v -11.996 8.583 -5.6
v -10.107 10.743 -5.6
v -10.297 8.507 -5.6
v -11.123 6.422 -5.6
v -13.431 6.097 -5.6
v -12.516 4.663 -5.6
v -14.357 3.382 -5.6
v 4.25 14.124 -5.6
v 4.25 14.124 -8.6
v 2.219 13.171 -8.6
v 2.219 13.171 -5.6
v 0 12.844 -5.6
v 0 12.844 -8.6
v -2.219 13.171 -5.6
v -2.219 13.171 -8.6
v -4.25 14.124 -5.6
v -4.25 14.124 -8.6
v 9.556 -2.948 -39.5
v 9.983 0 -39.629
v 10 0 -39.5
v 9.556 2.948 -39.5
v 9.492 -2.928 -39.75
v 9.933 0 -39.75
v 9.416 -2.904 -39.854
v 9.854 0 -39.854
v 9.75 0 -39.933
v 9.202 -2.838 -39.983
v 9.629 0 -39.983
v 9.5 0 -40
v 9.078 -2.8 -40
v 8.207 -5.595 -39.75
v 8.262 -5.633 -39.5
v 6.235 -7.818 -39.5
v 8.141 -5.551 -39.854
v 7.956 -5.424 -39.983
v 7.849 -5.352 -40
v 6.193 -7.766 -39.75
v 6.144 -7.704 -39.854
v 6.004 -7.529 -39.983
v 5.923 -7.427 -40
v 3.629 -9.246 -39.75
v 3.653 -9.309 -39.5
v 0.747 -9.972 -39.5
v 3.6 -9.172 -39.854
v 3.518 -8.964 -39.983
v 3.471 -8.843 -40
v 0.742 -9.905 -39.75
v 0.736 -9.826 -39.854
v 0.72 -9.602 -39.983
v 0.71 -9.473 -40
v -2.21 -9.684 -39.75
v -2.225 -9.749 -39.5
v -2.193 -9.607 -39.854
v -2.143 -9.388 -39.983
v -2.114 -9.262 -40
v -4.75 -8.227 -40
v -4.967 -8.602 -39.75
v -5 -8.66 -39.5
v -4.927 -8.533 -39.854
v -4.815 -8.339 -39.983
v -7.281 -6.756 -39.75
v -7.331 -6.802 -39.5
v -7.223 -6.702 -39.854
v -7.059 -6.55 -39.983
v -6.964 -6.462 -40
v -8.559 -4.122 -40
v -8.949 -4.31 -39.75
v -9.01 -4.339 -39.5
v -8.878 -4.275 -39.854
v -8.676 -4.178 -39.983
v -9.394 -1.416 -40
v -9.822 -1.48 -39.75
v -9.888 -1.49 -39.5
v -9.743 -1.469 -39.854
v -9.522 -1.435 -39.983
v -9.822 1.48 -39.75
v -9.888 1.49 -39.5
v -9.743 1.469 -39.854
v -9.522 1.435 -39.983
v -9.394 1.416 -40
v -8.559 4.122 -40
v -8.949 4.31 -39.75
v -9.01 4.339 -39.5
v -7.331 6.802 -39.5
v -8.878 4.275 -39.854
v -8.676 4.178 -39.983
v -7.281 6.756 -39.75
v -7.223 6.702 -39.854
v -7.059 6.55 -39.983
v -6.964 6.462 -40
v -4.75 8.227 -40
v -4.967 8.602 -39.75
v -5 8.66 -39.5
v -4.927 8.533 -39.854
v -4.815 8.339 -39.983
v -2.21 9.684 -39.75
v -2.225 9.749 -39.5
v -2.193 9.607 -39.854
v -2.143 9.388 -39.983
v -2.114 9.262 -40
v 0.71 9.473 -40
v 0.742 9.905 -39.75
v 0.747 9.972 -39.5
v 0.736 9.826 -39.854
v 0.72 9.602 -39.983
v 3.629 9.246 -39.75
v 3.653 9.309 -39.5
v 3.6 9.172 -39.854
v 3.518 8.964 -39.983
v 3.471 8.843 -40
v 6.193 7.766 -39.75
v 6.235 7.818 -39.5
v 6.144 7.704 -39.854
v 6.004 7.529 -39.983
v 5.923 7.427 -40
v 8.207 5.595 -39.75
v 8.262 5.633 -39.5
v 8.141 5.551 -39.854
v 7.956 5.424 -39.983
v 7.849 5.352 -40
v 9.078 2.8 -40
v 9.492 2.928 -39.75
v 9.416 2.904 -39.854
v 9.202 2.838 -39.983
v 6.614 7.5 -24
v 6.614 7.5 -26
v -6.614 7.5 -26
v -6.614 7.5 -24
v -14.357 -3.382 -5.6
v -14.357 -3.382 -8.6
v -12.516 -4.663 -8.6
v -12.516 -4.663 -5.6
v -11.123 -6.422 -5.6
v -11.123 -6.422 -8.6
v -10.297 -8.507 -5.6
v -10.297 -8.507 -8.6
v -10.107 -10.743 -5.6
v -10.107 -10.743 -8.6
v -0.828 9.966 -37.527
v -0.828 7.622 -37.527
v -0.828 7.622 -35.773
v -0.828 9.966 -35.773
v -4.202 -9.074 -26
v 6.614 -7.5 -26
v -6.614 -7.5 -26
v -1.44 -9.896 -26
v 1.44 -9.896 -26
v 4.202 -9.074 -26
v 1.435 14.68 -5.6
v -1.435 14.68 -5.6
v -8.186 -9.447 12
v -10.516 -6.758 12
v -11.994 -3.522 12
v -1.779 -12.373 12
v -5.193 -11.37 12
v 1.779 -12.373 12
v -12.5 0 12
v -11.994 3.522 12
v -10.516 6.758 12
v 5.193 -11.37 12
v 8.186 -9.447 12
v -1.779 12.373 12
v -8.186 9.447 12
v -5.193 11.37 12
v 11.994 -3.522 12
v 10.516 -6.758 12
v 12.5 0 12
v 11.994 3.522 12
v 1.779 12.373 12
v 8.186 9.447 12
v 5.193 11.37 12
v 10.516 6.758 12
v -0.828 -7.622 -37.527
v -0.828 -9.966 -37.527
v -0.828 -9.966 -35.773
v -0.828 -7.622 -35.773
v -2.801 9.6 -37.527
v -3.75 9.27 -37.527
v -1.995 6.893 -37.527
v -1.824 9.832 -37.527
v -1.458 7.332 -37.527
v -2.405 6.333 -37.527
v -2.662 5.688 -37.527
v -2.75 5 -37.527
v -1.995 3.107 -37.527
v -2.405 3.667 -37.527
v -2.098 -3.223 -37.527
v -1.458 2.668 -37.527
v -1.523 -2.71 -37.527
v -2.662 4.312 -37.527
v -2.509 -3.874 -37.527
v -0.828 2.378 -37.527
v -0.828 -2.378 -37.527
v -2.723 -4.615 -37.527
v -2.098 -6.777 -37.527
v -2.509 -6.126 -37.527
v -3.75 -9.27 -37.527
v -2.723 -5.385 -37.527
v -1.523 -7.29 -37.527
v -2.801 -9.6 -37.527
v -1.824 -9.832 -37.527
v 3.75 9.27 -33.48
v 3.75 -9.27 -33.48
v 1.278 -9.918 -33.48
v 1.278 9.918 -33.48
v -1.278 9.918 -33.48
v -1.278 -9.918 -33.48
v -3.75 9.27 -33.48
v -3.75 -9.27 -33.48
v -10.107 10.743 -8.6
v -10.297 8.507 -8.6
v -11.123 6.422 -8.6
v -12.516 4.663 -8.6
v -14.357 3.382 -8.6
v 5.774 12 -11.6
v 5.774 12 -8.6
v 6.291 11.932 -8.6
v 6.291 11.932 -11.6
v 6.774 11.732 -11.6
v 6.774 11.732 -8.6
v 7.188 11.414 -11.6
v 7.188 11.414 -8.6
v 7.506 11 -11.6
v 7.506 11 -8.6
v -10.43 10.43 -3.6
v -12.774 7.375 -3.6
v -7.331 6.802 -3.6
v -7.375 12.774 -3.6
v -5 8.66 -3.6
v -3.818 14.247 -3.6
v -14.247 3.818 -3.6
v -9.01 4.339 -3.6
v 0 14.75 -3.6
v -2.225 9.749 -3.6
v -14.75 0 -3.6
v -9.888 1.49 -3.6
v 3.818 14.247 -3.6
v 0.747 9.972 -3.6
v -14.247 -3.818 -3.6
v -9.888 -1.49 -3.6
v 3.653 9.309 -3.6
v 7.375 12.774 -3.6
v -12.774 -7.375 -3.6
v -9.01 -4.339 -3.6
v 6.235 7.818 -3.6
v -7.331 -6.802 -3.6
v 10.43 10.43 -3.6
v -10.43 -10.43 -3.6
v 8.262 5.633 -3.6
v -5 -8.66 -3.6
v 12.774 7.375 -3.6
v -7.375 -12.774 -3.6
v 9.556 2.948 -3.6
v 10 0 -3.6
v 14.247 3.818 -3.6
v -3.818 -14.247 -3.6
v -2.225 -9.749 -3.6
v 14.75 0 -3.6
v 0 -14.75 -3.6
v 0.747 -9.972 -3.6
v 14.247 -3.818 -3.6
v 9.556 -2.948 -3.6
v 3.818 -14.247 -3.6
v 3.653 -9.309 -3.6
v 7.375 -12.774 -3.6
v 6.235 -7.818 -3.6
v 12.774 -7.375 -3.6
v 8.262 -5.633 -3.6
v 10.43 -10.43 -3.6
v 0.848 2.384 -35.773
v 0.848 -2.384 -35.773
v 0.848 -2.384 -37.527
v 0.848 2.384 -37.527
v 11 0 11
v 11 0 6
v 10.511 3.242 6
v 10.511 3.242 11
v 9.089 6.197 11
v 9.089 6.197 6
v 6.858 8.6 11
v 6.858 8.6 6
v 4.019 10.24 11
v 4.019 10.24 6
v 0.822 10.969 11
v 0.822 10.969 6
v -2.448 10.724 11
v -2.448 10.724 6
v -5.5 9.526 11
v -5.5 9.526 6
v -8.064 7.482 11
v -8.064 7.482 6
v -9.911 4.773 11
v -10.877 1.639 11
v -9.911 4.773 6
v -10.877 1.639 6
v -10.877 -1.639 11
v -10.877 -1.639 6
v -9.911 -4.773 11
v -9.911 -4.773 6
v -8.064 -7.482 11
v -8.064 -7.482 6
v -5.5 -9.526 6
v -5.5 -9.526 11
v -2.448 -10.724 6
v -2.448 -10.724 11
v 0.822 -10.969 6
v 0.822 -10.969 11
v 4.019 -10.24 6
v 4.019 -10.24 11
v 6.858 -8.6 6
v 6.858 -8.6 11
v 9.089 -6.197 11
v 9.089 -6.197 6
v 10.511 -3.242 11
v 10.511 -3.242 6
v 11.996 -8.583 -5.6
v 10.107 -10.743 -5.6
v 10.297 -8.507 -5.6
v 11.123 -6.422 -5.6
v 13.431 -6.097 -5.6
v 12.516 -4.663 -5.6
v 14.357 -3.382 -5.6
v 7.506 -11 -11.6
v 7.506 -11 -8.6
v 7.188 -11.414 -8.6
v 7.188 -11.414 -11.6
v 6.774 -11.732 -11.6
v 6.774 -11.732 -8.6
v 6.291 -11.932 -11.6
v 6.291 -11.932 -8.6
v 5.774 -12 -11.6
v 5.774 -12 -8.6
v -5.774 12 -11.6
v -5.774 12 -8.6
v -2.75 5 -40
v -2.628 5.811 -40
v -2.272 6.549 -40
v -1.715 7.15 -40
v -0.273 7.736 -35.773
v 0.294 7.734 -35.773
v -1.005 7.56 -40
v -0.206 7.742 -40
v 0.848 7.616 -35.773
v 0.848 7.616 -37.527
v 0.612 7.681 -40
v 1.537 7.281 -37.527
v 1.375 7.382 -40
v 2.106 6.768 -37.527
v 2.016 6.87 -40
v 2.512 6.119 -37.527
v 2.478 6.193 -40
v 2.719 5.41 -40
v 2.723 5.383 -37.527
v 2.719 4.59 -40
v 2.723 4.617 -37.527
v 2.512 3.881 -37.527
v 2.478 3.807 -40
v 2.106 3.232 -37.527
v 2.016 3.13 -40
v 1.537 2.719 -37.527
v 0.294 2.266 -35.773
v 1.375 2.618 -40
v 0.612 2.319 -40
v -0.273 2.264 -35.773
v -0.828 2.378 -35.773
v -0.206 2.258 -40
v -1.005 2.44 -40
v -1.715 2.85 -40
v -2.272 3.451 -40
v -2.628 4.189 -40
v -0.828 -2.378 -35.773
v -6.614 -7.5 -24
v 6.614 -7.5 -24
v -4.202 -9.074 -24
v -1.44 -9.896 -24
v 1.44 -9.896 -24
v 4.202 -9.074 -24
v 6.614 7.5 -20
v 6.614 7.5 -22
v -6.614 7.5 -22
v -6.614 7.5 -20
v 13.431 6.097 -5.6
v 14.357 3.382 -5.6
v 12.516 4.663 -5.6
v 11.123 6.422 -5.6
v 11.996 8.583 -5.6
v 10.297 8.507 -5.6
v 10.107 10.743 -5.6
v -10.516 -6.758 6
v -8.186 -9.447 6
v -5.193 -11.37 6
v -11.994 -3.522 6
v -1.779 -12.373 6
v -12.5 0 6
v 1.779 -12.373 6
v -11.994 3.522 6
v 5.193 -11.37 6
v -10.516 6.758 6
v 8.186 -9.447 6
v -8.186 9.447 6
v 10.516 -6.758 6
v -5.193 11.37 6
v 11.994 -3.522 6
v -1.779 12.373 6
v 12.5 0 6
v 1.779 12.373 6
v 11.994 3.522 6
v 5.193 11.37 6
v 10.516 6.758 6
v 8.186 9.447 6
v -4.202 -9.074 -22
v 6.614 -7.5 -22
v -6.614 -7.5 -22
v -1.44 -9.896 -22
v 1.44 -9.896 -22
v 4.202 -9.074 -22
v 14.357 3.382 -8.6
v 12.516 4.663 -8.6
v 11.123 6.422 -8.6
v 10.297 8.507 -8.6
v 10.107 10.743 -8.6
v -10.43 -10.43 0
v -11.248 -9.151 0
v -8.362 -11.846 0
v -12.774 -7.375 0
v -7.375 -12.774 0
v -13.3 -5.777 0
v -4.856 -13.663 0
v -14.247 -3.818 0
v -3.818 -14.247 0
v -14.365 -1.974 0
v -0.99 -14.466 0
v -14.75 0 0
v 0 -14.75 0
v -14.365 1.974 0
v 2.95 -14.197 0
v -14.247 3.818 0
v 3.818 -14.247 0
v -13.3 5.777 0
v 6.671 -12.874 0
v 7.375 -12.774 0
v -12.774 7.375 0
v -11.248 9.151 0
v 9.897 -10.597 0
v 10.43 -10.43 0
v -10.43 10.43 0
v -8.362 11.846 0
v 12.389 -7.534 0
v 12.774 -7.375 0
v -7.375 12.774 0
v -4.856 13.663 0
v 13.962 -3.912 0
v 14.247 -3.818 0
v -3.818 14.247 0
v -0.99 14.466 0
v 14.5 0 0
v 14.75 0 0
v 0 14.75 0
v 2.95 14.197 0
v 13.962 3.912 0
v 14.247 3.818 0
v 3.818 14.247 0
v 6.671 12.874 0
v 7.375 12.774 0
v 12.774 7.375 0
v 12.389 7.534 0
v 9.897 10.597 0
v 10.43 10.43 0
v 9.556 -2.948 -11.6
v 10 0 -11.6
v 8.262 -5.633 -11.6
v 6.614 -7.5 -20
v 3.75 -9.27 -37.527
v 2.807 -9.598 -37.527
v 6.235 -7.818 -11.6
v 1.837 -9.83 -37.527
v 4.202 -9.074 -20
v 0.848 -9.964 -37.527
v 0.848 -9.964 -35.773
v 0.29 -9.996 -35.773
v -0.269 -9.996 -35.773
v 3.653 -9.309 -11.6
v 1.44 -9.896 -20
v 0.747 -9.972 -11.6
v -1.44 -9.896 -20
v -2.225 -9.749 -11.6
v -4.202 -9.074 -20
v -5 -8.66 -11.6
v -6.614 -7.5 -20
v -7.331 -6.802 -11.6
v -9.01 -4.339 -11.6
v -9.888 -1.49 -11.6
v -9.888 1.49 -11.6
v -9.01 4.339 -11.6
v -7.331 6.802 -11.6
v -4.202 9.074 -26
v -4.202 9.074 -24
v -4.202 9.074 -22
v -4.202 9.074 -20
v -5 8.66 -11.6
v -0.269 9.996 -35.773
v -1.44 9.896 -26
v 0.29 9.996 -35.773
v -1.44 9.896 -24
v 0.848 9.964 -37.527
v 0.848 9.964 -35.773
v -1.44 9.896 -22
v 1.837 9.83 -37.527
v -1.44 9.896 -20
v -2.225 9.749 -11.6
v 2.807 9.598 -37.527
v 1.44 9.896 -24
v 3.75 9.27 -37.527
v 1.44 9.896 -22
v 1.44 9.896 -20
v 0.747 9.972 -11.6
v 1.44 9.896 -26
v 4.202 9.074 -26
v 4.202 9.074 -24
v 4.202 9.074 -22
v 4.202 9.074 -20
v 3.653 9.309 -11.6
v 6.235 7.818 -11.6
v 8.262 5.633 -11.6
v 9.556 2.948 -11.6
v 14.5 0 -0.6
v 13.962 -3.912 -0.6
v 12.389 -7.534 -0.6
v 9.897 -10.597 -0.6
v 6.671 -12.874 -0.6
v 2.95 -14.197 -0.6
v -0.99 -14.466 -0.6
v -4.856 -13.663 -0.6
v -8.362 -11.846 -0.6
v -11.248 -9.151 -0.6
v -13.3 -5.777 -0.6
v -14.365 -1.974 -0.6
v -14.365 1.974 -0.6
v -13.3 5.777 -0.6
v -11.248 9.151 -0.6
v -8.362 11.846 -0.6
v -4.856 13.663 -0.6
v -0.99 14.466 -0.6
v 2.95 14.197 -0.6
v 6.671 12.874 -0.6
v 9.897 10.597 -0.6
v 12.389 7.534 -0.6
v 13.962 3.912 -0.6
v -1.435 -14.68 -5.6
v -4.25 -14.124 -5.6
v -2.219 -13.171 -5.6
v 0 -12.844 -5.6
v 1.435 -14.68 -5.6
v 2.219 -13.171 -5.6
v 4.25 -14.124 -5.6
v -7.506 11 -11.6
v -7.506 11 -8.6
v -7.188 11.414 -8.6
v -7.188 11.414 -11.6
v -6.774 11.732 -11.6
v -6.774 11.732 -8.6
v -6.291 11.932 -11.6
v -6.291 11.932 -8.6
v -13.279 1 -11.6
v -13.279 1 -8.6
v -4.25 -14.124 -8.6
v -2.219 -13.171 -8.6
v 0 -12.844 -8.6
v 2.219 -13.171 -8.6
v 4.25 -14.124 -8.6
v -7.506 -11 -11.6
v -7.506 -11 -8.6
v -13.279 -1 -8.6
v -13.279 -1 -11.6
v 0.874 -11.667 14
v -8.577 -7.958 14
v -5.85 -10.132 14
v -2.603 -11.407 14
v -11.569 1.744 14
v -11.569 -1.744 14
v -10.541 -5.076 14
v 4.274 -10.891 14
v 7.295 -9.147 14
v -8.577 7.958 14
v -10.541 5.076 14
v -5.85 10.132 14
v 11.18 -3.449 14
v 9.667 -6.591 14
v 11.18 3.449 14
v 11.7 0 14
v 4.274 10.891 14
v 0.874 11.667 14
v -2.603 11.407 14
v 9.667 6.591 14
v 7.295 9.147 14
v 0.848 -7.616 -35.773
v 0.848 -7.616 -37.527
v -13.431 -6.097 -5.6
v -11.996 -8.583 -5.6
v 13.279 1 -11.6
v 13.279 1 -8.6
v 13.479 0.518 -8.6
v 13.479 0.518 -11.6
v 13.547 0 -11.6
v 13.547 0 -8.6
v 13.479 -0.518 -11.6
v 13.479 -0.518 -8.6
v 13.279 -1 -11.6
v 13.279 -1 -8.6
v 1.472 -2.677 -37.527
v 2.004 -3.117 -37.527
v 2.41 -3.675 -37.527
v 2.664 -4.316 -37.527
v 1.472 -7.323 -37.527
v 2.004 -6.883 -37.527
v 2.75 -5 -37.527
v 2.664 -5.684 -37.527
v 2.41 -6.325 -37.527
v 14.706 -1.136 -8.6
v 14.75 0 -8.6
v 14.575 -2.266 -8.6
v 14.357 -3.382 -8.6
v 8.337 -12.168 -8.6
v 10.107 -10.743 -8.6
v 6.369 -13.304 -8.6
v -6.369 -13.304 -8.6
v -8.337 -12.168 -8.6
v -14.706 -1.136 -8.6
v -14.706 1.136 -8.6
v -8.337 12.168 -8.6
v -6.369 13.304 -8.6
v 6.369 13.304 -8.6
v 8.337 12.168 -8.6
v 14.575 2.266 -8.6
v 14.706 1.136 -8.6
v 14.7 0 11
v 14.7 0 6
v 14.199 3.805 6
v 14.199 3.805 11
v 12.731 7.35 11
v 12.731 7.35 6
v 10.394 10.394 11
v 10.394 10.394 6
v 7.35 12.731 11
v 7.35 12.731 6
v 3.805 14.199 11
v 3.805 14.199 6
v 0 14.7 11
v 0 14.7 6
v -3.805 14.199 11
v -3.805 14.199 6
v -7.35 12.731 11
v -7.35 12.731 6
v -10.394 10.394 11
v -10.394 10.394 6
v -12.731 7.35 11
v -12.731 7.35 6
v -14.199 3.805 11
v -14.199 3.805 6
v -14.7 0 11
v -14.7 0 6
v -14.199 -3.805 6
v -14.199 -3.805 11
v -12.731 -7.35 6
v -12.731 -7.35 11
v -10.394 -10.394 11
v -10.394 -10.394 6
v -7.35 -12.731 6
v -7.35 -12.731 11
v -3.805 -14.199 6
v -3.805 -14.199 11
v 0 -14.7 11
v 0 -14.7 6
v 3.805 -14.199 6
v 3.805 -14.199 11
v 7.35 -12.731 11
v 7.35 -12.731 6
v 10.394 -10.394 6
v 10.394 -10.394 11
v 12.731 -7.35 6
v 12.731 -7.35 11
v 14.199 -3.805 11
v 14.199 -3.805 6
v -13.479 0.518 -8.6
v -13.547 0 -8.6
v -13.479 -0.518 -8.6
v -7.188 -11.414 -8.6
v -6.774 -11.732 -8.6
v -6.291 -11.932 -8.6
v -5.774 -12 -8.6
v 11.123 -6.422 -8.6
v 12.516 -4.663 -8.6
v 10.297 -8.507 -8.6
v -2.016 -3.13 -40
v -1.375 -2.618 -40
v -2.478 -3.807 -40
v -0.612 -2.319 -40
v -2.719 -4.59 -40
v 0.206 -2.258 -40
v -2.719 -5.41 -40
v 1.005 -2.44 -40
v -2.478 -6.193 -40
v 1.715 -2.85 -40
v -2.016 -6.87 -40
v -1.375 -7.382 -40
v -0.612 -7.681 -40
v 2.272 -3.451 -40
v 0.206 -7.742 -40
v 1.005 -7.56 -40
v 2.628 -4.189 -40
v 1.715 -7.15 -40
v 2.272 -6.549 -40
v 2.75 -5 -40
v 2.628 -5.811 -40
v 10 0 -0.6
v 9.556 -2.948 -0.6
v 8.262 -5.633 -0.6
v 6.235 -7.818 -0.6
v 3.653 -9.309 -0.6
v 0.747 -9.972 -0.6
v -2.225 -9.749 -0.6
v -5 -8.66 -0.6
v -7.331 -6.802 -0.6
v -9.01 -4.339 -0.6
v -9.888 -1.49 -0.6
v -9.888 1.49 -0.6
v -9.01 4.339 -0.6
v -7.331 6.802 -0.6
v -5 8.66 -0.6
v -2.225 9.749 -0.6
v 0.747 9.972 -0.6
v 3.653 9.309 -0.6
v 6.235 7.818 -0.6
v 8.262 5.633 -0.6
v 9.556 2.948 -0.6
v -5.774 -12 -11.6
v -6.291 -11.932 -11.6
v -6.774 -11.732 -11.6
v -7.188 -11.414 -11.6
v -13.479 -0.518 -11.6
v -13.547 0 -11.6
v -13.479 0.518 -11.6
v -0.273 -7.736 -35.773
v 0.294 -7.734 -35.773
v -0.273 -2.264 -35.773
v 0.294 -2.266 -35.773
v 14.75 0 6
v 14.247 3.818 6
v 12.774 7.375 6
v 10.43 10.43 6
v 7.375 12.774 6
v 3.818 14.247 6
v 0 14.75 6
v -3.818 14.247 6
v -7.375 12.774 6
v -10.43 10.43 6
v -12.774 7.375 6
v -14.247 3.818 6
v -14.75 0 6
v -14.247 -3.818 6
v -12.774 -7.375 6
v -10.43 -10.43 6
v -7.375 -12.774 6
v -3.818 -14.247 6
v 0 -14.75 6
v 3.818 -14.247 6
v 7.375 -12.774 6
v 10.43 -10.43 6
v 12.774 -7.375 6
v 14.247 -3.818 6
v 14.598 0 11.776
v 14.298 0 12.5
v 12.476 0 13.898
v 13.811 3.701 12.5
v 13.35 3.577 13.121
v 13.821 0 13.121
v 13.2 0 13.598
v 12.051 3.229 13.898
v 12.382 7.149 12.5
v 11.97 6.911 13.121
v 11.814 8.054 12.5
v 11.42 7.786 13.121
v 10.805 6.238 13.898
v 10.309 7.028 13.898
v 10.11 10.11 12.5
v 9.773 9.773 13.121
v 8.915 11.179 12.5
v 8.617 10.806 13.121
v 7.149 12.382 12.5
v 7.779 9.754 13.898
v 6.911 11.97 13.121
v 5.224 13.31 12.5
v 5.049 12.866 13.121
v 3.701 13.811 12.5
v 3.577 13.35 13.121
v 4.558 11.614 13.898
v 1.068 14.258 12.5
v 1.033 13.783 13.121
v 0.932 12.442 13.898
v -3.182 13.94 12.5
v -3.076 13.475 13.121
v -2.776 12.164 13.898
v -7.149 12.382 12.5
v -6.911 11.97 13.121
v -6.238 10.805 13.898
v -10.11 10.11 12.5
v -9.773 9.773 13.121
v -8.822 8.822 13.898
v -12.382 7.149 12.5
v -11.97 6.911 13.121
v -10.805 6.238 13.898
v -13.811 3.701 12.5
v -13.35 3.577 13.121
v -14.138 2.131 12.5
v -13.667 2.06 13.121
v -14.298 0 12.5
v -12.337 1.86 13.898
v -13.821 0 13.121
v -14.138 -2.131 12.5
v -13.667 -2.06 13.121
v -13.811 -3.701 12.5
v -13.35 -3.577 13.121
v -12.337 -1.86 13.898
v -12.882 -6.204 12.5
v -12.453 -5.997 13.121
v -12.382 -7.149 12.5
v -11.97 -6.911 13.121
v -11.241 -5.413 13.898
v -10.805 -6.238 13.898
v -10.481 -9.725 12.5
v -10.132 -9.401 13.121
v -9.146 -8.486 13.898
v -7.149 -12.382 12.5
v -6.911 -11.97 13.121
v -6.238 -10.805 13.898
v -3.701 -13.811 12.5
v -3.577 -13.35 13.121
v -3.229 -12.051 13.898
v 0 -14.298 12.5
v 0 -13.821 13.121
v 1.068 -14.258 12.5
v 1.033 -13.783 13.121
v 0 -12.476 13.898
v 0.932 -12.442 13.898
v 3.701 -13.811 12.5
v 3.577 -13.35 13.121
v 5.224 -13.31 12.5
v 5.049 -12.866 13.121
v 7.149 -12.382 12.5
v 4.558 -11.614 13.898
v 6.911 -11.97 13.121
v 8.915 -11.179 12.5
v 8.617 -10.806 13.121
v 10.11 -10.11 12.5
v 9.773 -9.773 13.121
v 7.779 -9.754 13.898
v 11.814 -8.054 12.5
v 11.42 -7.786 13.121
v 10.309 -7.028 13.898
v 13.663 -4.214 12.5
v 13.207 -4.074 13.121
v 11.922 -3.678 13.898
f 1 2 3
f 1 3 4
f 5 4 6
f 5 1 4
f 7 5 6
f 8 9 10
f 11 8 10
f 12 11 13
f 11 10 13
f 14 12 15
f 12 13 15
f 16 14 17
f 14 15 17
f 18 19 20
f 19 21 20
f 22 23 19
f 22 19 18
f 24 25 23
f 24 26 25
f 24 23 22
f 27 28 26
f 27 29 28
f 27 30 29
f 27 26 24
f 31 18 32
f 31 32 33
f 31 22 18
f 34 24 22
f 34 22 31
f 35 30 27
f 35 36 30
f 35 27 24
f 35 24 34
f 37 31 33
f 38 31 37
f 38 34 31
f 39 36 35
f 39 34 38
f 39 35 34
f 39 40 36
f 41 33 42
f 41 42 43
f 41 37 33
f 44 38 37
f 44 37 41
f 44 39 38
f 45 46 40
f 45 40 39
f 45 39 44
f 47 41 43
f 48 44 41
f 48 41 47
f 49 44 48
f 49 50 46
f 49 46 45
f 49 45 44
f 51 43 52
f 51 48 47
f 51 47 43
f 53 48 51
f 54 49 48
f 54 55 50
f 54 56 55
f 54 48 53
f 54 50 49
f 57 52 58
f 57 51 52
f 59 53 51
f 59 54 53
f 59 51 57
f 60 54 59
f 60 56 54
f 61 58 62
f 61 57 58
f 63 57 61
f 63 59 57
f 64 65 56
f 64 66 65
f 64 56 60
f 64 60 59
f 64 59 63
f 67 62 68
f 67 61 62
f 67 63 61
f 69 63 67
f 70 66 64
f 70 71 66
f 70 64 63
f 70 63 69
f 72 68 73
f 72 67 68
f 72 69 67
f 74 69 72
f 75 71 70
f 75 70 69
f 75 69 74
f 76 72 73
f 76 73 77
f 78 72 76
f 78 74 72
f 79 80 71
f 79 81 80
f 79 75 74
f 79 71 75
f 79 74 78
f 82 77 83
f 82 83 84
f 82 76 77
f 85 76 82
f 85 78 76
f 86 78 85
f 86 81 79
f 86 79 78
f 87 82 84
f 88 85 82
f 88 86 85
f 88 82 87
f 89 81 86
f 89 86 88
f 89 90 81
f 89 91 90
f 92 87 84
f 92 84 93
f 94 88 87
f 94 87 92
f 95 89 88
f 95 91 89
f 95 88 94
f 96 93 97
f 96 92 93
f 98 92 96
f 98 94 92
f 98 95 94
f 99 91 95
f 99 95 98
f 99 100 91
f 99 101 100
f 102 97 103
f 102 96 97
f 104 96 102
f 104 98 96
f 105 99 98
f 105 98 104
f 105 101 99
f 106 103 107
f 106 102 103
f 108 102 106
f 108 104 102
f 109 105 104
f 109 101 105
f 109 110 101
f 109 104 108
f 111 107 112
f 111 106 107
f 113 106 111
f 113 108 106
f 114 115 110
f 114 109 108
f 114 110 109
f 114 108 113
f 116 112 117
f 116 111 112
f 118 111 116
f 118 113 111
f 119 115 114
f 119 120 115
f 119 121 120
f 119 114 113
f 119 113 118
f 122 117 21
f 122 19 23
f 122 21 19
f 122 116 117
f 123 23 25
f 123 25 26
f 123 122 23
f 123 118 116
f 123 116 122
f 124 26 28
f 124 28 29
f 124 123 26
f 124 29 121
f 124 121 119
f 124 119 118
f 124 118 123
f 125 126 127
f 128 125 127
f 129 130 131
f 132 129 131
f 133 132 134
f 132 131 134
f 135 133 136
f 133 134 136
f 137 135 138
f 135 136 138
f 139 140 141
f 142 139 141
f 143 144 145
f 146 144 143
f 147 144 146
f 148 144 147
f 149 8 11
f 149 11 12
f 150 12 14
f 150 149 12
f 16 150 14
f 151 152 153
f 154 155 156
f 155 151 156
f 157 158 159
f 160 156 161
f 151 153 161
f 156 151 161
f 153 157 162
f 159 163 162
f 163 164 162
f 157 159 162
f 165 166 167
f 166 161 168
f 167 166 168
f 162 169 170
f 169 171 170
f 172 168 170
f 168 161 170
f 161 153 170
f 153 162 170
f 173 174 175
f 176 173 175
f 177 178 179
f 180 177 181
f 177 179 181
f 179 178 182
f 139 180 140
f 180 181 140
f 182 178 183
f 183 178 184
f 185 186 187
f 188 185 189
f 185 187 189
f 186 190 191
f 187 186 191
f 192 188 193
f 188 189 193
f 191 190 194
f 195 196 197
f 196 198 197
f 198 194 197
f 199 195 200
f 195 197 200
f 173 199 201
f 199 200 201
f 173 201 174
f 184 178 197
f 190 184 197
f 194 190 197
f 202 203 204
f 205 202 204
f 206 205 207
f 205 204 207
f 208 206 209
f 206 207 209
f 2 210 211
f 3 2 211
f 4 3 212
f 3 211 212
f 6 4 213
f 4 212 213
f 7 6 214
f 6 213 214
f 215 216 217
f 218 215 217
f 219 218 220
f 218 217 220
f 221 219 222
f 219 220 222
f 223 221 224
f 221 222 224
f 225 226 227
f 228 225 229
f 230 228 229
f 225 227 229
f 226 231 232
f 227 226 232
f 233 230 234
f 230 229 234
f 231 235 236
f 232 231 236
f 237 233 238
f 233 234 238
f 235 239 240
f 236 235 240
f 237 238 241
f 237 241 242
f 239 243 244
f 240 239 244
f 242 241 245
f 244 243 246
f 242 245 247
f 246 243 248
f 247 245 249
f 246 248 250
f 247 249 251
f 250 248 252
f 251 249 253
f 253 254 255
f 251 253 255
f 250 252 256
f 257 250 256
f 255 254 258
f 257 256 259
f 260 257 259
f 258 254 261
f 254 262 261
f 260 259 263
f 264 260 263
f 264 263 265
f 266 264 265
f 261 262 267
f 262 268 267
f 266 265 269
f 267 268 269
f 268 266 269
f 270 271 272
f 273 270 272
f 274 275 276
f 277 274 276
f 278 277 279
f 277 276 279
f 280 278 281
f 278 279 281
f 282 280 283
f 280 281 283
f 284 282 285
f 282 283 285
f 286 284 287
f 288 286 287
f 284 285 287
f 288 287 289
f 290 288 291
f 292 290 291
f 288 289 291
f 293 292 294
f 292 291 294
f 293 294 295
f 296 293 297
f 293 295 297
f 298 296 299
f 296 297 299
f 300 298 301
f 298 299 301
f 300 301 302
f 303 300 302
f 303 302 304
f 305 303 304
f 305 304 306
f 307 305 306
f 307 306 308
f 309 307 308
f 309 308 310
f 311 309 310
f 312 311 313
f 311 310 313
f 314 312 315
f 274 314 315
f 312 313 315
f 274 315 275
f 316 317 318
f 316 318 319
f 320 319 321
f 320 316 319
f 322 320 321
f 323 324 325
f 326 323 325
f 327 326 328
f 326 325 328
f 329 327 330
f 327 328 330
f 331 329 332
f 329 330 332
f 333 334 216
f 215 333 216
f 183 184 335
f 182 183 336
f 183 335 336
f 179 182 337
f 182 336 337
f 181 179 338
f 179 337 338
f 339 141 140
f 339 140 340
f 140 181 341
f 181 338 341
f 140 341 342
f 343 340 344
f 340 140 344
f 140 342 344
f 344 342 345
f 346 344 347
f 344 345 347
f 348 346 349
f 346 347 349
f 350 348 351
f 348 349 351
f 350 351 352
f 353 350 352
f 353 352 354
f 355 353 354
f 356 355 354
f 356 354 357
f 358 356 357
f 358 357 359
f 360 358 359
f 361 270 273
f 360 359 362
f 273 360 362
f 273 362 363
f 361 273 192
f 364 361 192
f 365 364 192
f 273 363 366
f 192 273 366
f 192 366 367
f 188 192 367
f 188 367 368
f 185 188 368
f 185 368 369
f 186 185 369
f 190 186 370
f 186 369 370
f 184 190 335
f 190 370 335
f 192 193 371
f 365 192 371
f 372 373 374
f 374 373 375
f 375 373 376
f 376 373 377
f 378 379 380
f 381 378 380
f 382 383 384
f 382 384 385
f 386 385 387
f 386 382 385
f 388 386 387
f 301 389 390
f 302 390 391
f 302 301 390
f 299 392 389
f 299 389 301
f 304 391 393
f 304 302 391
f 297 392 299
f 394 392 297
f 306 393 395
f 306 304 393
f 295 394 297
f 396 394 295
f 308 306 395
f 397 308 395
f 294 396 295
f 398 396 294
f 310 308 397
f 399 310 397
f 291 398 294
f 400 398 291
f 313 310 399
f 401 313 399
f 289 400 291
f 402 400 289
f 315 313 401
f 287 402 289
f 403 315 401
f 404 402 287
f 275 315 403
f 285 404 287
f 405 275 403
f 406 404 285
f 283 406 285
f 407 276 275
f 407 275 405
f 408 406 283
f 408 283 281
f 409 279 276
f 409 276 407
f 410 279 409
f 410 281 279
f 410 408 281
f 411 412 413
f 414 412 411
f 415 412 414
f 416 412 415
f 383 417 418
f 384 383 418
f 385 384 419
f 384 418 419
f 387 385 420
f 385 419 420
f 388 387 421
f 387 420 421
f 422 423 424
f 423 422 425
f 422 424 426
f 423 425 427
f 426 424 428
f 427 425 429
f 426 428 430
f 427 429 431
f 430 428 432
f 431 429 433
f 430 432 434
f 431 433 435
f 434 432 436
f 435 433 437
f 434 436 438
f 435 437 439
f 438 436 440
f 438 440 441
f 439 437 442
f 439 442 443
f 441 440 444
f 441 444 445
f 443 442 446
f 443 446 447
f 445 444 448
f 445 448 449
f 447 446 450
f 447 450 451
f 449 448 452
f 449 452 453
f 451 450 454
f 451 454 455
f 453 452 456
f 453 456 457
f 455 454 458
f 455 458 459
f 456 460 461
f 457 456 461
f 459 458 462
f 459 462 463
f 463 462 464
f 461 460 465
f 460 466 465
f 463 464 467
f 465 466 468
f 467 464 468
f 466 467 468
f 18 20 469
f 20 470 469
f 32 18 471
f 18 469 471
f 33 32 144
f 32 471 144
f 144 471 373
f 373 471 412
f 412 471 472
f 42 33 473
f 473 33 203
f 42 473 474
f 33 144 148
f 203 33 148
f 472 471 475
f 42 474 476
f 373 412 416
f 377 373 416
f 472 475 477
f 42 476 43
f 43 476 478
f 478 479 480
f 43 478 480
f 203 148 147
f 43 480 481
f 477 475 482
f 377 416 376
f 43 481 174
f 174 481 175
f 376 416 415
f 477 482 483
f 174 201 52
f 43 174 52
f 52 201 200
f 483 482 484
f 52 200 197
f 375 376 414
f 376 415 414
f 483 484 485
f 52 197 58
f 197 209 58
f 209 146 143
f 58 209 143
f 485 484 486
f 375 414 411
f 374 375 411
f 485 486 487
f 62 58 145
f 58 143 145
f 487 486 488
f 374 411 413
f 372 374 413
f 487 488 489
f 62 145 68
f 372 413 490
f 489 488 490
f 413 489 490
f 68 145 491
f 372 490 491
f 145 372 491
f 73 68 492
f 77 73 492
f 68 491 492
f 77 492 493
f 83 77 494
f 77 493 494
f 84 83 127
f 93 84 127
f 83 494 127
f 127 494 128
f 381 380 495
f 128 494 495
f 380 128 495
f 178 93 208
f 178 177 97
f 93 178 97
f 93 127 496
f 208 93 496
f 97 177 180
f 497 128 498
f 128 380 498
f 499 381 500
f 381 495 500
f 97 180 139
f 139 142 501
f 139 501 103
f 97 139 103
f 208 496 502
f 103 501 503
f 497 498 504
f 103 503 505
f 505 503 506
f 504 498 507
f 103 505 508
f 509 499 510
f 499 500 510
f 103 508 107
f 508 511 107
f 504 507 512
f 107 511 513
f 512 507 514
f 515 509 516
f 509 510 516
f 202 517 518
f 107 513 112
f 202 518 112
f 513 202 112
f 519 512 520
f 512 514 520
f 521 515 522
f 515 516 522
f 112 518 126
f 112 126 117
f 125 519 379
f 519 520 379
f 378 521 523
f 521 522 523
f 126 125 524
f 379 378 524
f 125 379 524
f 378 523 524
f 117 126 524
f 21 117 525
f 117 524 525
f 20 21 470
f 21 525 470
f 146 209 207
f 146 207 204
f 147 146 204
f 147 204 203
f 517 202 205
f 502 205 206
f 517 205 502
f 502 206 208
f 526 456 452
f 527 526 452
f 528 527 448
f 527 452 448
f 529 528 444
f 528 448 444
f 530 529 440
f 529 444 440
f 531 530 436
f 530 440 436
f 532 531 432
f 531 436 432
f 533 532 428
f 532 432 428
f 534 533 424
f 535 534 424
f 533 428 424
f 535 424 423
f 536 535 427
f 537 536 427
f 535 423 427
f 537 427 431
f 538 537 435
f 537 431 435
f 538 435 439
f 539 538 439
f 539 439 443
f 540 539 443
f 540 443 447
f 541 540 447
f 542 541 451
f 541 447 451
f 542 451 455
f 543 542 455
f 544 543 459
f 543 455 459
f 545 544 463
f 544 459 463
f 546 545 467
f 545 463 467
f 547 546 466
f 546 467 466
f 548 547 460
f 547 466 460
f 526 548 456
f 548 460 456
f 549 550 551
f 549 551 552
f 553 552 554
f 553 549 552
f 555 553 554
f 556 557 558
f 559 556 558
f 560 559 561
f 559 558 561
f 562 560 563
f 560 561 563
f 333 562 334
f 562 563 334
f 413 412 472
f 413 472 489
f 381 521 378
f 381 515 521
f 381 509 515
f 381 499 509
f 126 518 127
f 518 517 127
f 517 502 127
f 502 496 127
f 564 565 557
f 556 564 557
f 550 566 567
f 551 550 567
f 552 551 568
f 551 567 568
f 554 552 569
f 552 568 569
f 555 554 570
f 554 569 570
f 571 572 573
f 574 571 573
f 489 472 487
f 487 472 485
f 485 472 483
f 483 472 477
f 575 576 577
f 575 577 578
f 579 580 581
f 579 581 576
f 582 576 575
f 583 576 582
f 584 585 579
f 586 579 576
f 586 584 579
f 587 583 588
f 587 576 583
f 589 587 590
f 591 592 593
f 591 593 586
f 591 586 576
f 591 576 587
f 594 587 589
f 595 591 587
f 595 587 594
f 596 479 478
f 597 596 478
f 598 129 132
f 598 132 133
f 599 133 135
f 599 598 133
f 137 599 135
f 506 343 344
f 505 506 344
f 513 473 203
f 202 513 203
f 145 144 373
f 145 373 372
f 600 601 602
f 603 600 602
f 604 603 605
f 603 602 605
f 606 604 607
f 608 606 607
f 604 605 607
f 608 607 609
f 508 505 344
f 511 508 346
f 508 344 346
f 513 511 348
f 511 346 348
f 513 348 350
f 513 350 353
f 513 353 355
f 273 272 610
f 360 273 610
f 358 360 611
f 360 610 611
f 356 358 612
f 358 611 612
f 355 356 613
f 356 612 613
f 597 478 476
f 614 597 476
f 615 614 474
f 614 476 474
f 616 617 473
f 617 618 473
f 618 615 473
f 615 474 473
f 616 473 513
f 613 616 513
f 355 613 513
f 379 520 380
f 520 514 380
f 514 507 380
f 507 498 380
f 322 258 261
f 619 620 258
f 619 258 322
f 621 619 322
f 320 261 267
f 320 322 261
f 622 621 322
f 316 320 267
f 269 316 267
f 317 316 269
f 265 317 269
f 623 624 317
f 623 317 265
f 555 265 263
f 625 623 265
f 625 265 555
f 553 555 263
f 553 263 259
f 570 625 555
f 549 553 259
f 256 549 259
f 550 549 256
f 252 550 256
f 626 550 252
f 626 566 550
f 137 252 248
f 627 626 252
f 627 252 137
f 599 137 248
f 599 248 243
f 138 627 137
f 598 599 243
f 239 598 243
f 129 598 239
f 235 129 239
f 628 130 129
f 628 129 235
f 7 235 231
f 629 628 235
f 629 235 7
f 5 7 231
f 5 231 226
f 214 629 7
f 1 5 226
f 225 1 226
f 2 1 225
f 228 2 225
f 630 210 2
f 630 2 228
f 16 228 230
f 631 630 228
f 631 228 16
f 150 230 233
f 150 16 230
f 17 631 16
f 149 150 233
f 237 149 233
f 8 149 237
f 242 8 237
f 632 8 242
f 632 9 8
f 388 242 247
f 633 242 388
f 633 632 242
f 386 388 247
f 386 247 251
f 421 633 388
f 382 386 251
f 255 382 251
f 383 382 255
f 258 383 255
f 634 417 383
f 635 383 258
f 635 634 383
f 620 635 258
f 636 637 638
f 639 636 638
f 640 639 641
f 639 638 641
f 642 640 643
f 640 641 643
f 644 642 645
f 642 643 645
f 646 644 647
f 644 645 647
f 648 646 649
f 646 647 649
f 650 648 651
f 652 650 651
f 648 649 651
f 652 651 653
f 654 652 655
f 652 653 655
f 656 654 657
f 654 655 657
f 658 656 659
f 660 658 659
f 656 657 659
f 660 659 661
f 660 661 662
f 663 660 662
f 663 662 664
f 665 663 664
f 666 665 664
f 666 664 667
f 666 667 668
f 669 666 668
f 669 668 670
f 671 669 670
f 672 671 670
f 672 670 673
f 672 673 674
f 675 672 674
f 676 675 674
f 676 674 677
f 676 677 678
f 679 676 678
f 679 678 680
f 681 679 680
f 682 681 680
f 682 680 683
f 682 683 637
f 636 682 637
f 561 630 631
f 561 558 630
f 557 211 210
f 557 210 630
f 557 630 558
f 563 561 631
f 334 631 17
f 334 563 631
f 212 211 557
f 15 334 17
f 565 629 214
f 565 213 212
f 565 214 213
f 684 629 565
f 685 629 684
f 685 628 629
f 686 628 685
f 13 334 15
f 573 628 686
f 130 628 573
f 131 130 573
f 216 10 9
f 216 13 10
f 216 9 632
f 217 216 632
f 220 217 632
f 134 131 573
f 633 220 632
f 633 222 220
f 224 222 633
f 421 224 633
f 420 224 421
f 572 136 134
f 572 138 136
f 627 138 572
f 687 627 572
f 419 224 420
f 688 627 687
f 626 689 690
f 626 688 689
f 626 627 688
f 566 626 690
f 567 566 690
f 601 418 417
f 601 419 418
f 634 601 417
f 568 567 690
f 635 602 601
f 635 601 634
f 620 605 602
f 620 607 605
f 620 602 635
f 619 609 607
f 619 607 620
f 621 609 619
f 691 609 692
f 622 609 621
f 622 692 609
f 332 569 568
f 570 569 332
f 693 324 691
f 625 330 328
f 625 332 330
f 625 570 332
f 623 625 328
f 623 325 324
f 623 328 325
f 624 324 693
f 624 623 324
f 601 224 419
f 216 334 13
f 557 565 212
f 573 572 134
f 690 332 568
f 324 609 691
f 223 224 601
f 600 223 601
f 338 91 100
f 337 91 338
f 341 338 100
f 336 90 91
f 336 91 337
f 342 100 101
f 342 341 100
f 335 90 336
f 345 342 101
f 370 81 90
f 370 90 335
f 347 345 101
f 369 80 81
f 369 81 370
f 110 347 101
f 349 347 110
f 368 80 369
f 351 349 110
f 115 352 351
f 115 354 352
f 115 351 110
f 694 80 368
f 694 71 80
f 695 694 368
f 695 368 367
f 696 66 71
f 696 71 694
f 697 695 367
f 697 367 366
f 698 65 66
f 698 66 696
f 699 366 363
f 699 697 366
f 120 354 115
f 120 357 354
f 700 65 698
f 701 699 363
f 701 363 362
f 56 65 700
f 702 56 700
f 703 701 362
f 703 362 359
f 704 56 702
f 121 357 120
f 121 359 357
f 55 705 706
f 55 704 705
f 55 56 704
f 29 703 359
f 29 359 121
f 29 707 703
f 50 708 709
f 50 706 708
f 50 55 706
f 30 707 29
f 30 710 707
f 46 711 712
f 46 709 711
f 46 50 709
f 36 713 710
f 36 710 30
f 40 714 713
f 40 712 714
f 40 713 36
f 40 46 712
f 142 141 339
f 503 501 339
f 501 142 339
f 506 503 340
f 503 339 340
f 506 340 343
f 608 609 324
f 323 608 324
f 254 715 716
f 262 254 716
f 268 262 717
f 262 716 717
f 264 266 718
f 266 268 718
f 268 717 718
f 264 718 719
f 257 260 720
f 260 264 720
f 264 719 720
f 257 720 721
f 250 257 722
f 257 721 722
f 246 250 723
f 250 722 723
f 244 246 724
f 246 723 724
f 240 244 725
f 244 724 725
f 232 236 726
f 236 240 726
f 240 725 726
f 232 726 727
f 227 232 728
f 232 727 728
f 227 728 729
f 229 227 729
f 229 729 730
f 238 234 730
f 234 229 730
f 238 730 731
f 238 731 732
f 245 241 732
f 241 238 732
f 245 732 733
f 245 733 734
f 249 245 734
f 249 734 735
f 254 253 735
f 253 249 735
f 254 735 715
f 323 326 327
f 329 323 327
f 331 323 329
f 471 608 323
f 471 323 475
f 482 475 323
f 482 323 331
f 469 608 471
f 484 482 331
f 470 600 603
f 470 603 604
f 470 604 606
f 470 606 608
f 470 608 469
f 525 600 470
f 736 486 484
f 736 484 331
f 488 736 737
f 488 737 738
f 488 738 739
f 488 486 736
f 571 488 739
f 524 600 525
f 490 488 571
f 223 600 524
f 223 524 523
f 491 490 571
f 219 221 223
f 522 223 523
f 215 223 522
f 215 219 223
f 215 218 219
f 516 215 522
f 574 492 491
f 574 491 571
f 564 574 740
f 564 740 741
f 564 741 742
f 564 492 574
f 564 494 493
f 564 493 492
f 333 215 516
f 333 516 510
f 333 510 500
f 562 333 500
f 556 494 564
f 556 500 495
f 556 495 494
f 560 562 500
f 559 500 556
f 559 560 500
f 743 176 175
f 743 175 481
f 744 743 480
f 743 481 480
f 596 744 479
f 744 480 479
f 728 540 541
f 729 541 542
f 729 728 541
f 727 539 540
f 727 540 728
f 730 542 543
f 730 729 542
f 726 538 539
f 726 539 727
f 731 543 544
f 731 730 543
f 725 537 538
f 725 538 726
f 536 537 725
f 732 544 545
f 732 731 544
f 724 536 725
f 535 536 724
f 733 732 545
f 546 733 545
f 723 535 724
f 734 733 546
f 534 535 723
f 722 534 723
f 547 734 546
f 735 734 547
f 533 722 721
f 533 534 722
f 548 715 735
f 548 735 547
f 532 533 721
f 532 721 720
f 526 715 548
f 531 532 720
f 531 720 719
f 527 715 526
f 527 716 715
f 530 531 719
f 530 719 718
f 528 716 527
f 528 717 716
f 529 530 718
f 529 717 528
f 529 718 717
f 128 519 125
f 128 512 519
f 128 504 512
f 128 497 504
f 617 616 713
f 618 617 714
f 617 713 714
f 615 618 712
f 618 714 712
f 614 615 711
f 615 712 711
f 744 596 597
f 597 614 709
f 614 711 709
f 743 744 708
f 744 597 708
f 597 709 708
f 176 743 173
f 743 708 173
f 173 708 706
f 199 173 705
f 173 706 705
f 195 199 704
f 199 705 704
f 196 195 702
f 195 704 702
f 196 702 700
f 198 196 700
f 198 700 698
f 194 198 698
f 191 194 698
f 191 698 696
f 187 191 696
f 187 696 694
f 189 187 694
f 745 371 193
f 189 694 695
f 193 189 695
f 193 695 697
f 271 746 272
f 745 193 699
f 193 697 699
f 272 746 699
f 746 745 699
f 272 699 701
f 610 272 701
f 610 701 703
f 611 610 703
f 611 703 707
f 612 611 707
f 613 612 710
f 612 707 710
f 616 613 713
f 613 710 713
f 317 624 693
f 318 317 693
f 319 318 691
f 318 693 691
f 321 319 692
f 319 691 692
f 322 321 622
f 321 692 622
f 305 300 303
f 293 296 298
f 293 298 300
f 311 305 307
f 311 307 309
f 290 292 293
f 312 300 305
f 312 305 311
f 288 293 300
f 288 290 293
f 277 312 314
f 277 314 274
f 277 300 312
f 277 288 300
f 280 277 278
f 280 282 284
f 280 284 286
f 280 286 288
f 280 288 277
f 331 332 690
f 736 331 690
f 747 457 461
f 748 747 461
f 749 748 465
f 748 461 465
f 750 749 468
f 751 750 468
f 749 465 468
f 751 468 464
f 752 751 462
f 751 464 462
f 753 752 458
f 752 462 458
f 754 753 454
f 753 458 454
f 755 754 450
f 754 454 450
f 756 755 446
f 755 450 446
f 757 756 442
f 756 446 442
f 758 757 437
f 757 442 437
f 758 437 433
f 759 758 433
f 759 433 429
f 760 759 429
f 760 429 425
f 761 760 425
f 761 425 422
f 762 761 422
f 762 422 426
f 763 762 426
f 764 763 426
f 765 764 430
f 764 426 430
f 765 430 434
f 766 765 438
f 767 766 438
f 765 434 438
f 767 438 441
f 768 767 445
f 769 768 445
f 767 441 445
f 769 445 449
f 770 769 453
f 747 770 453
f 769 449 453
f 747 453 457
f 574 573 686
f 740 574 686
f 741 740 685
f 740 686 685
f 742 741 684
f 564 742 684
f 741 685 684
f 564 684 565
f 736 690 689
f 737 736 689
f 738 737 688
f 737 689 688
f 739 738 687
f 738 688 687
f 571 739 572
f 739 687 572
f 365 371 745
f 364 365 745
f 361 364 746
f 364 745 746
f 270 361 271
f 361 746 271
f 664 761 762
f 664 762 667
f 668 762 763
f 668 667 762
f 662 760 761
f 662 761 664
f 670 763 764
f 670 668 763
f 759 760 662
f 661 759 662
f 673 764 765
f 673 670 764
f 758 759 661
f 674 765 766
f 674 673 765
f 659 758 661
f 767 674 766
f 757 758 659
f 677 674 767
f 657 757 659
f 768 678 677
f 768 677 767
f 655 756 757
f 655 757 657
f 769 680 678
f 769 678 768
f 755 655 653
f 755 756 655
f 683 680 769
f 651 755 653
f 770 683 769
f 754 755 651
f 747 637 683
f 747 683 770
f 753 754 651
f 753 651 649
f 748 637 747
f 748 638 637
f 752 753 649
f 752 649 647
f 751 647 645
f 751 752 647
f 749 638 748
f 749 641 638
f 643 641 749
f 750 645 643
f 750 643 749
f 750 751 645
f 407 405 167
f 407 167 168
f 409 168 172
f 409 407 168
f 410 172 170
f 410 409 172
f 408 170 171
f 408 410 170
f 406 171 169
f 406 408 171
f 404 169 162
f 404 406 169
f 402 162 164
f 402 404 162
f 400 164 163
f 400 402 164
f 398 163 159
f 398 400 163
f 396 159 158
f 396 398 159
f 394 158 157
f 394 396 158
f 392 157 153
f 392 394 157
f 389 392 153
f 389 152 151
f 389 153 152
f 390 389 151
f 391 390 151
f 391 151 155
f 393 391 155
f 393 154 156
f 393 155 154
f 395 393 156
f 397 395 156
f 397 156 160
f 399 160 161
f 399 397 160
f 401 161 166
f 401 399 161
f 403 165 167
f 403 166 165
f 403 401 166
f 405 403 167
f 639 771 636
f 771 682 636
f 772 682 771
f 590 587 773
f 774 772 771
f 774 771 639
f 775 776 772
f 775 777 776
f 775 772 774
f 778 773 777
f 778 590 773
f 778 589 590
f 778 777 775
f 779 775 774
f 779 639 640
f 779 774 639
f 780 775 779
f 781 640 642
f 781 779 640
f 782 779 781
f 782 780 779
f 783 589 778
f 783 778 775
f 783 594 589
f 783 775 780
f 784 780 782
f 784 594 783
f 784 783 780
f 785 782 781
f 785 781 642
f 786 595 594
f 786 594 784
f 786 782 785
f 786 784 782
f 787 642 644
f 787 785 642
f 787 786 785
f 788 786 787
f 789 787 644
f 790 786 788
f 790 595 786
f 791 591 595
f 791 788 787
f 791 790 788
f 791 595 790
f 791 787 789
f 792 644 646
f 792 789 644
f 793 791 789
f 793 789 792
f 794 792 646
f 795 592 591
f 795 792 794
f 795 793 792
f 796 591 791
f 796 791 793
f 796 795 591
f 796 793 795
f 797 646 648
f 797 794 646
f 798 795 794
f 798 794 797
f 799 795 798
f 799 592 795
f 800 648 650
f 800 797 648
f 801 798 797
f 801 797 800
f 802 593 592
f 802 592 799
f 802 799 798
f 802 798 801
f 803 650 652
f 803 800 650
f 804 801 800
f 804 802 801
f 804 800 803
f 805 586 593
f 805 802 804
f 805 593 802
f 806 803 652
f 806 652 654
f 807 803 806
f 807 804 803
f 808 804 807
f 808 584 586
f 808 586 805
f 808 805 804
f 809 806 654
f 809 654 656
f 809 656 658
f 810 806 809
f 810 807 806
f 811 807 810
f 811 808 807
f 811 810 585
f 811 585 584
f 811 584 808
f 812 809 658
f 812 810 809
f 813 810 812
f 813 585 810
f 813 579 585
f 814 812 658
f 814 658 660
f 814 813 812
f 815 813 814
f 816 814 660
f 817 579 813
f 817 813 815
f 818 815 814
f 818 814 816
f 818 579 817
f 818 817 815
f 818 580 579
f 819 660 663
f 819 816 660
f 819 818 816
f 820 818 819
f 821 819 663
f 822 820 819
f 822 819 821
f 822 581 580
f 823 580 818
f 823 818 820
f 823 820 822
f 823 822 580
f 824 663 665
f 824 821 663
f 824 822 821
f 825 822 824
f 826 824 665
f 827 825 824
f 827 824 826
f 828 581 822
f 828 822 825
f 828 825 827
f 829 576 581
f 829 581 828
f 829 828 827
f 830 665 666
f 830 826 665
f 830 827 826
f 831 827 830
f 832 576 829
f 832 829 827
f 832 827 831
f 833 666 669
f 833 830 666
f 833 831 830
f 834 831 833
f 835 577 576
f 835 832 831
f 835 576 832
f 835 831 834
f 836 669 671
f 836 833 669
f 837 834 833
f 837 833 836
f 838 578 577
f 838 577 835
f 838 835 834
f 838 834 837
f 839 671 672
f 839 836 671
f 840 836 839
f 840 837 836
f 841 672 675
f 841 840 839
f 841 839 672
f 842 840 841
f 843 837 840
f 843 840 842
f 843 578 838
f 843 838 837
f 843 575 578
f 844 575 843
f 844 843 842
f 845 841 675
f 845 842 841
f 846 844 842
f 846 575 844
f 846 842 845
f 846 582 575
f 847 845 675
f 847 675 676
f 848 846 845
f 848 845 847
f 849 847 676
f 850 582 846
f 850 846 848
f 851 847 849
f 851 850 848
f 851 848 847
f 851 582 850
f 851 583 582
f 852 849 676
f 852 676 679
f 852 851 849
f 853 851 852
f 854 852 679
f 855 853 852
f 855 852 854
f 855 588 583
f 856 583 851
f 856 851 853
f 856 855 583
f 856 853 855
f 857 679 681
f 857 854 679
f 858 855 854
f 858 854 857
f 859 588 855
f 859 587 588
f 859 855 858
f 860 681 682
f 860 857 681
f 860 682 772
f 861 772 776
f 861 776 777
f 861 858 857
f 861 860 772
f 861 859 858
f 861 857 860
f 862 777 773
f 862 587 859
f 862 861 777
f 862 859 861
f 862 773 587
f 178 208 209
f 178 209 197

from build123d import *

# Parameters (mm, degrees)
ESBO_O1_R             = 14.75
EXTRUS_O1_DEPTH       = 6
ESBO_O2_R             = 10
EXTRUS_O2_DEPTH       = 40
ESBO_O3_R             = 11
EXTRUS_O3_DEPTH       = 5
ESBO_O4_R             = 14.7
ESBO_O4_R_2           = 12.5
EXTRUS_O4_DEPTH       = 8
EXTRUS_O5_START       = -2
ESBO_O5_R             = 14.7
EXTRUS_O5_DEPTH       = 2
FILETE2_R             = 3
ESBO_O6_R             = 14.5
EXTRUS_O6_DEPTH       = 0.6
EXTRUS_O7_START       = 8
ESBO_O7_R             = 14.75
EXTRUS_O7_DEPTH       = 5
CORTE_EXTRUS_O1_DEPTH = 3
CIRPATTERN1_COUNT     = 6
EXTRUS_O8_DEPTH       = 3
FILETE3_R             = 0.5
CORTE_EXTRUS_O2_START = -14
ESBO_O10_W            = 40
ESBO_O10_H            = 25
ESBO_O10_W_2          = 30
ESBO_O10_H_2          = 15
CORTE_EXTRUS_O2_DEPTH = 2
LPATTERN1_COUNT       = 2
LPATTERN1_PITCH       = 4
ESBO_O11_R            = 2.75
CORTE_EXTRUS_O3_DEPTH = 5
CORTE_EXTRUS_O4_DEPTH = 12.5


with BuildPart() as part:
    # Esboço1 → Extrusão1 (new body)
    with BuildSketch(Plane.XY):
        Circle(ESBO_O1_R)
    extrude(amount=EXTRUS_O1_DEPTH)

    # Esboço2 → Extrusão2 (add)
    with BuildSketch(Plane(origin=(0, 0, 0), x_dir=(-1, 0, 0), z_dir=(0, 0, -1))):
        with Locations(Location((0, 0, 0), (0, 0, 180))):
            Circle(ESBO_O2_R)
    extrude(amount=EXTRUS_O2_DEPTH)

    # Esboço3 → Extrusão3 (add)
    with BuildSketch(Plane.XY.offset(6)):
        Circle(ESBO_O3_R)
    extrude(amount=EXTRUS_O3_DEPTH)

    # Esboço4 → Extrusão4 (add)
    with BuildSketch(Plane.XY.offset(6)):
        Circle(ESBO_O4_R)
        Circle(ESBO_O4_R_2, mode=Mode.SUBTRACT)
    extrude(amount=EXTRUS_O4_DEPTH)

    # Esboço5 → Extrusão5 (add)
    with BuildSketch(Plane.XY.offset(14).offset(EXTRUS_O5_START)):
        Circle(ESBO_O5_R)
    extrude(amount=EXTRUS_O5_DEPTH)

    # Filete2
    filete2_edges = [part.edges().sort_by_distance(p)[0] for p in [
        (-14.7, 0, 14),
    ]]
    fillet(filete2_edges, radius=FILETE2_R)

    # Esboço6 → Extrusão6 (add)
    with BuildSketch(Plane(origin=(0, 0, 0), x_dir=(-1, 0, 0), z_dir=(0, 0, -1))):
        with Locations(Location((0, 0, 0), (0, 0, 180))):
            Circle(ESBO_O6_R)
    extrude(amount=EXTRUS_O6_DEPTH)

    # Esboço7 → Extrusão7 (add)
    with BuildSketch(Plane(origin=(0, 0, -0.6), x_dir=(-1, 0, 0), z_dir=(0, 0, -1)).offset(EXTRUS_O7_START)):
        with Locations(Location((0, 0, 0), (0, 0, 180))):
            Circle(ESBO_O7_R)
    extrude(amount=-EXTRUS_O7_DEPTH)

    # Esboço8 → Corte-extrusão1 (cut)
    with BuildSketch(Plane(origin=(0, 0, -8.6), x_dir=(-1, 0, 0), z_dir=(0, 0, -1))):
        with BuildLine():
            ThreePointArc((-4.25, 14.124446892), (0, 12.843637989), (4.25, 14.124446892))
            ThreePointArc((4.25, 14.124446892), (0, 15.884854532), (-4.25, 14.124446892))
        make_face()
    corte_extrus_o1 = extrude(amount=-CORTE_EXTRUS_O1_DEPTH, mode=Mode.SUBTRACT)

    # CirPattern1: Corte-extrusão1 ×6 about axis
    cirpattern1_axis = Axis((0, 0, 0), (0, 0, 1))
    for i in range(1, CIRPATTERN1_COUNT):
        add(corte_extrus_o1.rotate(cirpattern1_axis, i * 360 / CIRPATTERN1_COUNT), mode=Mode.SUBTRACT)

    # Esboço9 → Extrusão8 (add)
    with BuildSketch(Plane(origin=(0, 0, -8.6), x_dir=(-1, 0, 0), z_dir=(0, 0, -1))):
        with BuildLine():
            Line((-7.505553499, 11), (-13.279056191, 1))
            ThreePointArc((-13.279056191, 1), (-13.547005384, 0), (-13.279056191, -1))
            Line((-13.279056191, -1), (-7.505553499, -11))
            ThreePointArc((-7.505553499, -11), (-6.773502692, -11.732050808), (-5.773502692, -12))
            Line((-5.773502692, -12), (5.773502692, -12))
            ThreePointArc((5.773502692, -12), (6.773502692, -11.732050808), (7.505553499, -11))
            Line((7.505553499, -11), (13.279056191, -1))
            ThreePointArc((13.279056191, -1), (13.547005384, 0), (13.279056191, 1))
            Line((13.279056191, 1), (7.505553499, 11))
            ThreePointArc((7.505553499, 11), (6.773502692, 11.732050808), (5.773502692, 12))
            Line((5.773502692, 12), (-5.773502692, 12))
            ThreePointArc((-5.773502692, 12), (-6.773502692, 11.732050808), (-7.505553499, 11))
        make_face()
    extrude(amount=EXTRUS_O8_DEPTH)

    # Filete3
    filete3_edges = [part.edges().sort_by_distance(p)[0] for p in [
        (-10, 0, -40),
    ]]
    fillet(filete3_edges, radius=FILETE3_R)

    # Esboço10 → Corte-extrusão2 (cut)
    with BuildSketch(Plane(origin=(0, 0, -40), x_dir=(-1, 0, 0), z_dir=(0, 0, -1)).offset(CORTE_EXTRUS_O2_START)):
        Rectangle(ESBO_O10_W, ESBO_O10_H)
        Rectangle(ESBO_O10_W_2, ESBO_O10_H_2, mode=Mode.SUBTRACT)
    corte_extrus_o2 = extrude(amount=-CORTE_EXTRUS_O2_DEPTH, mode=Mode.SUBTRACT)

    # LPattern1: Corte-extrusão2 ×2
    with Locations(*[(0, 0, i * LPATTERN1_PITCH) for i in range(1, LPATTERN1_COUNT)]):
        add(corte_extrus_o2, mode=Mode.SUBTRACT)

    # Esboço11 → Corte-extrusão3 (cut)
    with BuildSketch(Plane(origin=(0, 0, -40), x_dir=(-1, 0, 0), z_dir=(0, 0, -1))):
        with Locations((0, 5)):
            Circle(ESBO_O11_R)
        with Locations(Location((0, -5, 0), (0, 0, 180))):
            Circle(ESBO_O11_R)
    extrude(amount=-CORTE_EXTRUS_O3_DEPTH, mode=Mode.SUBTRACT)

    # 3DSketch2 → Corte-extrusão4 (cut, symmetric)
    with BuildSketch(Plane(origin=(-3.75, 0, -37.527086784), x_dir=(0.8800460423188995, 0, 0.4748883694078451), z_dir=(0, -1, 0))):
        Polygon((0, 0), (2.571694256, -1.387731588), (3.404519941, 0.155631013), (4.879432804, -0.640257987), (4.046607118, -2.183620587), (6.600345317, -3.561662771), (8.52228138, 0), (1.921937352, 3.56166516), align=None)
    extrude(amount=CORTE_EXTRUS_O4_DEPTH, both=True, mode=Mode.SUBTRACT)


solid = part.part
